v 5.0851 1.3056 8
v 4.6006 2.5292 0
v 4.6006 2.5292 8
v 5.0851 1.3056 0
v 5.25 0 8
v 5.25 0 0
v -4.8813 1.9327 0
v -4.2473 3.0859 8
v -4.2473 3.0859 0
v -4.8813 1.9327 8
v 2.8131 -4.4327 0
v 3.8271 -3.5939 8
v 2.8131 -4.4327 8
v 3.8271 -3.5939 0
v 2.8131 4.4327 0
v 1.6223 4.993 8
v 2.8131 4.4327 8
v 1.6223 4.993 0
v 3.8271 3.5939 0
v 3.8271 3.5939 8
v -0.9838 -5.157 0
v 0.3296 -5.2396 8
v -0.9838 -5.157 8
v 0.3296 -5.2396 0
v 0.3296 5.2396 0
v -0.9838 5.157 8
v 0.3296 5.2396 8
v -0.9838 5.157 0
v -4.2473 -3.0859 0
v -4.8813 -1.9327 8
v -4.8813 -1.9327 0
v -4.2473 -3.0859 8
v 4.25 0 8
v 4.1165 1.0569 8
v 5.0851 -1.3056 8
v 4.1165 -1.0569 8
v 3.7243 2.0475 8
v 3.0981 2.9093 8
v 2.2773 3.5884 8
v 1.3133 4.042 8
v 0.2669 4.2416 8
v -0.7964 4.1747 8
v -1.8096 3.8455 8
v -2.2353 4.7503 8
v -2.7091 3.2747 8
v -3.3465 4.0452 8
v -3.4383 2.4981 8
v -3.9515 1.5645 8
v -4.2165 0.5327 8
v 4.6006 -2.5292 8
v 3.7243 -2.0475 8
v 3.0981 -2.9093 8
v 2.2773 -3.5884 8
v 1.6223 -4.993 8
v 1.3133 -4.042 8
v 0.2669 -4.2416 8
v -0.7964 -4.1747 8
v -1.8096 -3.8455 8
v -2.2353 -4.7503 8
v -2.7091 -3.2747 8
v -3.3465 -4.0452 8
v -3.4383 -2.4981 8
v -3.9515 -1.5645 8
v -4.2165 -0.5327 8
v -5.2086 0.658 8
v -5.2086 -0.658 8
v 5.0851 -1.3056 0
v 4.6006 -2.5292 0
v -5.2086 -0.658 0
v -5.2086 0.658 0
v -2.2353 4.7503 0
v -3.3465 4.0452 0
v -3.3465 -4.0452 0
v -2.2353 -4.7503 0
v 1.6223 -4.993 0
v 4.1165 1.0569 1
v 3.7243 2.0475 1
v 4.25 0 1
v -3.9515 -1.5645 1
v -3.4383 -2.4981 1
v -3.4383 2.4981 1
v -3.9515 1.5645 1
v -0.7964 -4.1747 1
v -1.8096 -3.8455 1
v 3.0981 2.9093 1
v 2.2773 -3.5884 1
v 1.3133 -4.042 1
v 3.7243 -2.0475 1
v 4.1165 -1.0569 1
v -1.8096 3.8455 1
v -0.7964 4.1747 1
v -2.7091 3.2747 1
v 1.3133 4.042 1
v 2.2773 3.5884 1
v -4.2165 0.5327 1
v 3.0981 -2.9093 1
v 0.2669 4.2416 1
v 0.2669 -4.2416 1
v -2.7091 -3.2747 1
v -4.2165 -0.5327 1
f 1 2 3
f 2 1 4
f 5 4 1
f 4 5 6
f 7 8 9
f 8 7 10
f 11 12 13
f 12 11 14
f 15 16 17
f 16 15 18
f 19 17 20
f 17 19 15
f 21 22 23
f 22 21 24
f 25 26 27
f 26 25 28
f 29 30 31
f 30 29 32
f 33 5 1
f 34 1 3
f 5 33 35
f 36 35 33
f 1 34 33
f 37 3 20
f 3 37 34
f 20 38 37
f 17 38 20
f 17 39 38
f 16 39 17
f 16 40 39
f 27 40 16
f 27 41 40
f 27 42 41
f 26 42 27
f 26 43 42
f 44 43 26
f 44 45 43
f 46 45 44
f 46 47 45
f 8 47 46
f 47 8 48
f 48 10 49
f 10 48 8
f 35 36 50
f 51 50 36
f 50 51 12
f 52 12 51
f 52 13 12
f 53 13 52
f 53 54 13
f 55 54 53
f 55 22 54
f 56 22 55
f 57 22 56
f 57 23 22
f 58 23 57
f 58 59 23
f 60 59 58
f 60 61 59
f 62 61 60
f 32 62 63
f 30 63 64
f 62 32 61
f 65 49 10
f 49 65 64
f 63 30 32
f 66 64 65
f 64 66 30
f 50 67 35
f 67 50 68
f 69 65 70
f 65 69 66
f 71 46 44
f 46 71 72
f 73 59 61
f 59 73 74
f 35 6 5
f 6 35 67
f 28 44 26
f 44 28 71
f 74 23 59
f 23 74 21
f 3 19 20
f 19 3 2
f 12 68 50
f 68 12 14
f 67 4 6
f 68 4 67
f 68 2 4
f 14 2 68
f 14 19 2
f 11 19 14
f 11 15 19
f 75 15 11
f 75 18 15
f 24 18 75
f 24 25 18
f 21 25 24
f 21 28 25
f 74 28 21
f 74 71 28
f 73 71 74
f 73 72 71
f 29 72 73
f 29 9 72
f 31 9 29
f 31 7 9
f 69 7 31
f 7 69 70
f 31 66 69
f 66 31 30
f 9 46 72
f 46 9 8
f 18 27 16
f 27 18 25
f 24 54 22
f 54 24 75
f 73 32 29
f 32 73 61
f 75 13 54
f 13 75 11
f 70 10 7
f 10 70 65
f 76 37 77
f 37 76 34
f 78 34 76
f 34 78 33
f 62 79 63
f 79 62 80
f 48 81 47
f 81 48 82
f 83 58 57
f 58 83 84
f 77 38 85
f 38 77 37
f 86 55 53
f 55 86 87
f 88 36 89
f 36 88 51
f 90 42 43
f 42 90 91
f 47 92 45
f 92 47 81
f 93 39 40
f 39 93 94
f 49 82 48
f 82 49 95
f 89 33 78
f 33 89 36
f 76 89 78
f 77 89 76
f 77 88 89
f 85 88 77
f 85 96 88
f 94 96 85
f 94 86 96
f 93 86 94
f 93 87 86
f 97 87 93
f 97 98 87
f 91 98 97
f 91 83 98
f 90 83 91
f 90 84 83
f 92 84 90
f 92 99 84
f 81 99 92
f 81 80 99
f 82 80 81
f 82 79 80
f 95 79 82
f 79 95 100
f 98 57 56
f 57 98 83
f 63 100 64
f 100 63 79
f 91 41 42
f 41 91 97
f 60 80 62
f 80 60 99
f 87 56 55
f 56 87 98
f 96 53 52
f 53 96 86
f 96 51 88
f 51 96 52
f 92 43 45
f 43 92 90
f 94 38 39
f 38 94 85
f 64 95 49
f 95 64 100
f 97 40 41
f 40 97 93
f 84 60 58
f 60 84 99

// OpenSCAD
$fn = 25;
stud_dia = 8.5;
wall_thk = 1;
base_thk = 1;
cap_depth = 8;

difference()
{
cylinder(d=(stud_dia+wall_thk*2),h=cap_depth);
translate([0,0,base_thk])
    cylinder(d=stud_dia,h=cap_depth);
}
